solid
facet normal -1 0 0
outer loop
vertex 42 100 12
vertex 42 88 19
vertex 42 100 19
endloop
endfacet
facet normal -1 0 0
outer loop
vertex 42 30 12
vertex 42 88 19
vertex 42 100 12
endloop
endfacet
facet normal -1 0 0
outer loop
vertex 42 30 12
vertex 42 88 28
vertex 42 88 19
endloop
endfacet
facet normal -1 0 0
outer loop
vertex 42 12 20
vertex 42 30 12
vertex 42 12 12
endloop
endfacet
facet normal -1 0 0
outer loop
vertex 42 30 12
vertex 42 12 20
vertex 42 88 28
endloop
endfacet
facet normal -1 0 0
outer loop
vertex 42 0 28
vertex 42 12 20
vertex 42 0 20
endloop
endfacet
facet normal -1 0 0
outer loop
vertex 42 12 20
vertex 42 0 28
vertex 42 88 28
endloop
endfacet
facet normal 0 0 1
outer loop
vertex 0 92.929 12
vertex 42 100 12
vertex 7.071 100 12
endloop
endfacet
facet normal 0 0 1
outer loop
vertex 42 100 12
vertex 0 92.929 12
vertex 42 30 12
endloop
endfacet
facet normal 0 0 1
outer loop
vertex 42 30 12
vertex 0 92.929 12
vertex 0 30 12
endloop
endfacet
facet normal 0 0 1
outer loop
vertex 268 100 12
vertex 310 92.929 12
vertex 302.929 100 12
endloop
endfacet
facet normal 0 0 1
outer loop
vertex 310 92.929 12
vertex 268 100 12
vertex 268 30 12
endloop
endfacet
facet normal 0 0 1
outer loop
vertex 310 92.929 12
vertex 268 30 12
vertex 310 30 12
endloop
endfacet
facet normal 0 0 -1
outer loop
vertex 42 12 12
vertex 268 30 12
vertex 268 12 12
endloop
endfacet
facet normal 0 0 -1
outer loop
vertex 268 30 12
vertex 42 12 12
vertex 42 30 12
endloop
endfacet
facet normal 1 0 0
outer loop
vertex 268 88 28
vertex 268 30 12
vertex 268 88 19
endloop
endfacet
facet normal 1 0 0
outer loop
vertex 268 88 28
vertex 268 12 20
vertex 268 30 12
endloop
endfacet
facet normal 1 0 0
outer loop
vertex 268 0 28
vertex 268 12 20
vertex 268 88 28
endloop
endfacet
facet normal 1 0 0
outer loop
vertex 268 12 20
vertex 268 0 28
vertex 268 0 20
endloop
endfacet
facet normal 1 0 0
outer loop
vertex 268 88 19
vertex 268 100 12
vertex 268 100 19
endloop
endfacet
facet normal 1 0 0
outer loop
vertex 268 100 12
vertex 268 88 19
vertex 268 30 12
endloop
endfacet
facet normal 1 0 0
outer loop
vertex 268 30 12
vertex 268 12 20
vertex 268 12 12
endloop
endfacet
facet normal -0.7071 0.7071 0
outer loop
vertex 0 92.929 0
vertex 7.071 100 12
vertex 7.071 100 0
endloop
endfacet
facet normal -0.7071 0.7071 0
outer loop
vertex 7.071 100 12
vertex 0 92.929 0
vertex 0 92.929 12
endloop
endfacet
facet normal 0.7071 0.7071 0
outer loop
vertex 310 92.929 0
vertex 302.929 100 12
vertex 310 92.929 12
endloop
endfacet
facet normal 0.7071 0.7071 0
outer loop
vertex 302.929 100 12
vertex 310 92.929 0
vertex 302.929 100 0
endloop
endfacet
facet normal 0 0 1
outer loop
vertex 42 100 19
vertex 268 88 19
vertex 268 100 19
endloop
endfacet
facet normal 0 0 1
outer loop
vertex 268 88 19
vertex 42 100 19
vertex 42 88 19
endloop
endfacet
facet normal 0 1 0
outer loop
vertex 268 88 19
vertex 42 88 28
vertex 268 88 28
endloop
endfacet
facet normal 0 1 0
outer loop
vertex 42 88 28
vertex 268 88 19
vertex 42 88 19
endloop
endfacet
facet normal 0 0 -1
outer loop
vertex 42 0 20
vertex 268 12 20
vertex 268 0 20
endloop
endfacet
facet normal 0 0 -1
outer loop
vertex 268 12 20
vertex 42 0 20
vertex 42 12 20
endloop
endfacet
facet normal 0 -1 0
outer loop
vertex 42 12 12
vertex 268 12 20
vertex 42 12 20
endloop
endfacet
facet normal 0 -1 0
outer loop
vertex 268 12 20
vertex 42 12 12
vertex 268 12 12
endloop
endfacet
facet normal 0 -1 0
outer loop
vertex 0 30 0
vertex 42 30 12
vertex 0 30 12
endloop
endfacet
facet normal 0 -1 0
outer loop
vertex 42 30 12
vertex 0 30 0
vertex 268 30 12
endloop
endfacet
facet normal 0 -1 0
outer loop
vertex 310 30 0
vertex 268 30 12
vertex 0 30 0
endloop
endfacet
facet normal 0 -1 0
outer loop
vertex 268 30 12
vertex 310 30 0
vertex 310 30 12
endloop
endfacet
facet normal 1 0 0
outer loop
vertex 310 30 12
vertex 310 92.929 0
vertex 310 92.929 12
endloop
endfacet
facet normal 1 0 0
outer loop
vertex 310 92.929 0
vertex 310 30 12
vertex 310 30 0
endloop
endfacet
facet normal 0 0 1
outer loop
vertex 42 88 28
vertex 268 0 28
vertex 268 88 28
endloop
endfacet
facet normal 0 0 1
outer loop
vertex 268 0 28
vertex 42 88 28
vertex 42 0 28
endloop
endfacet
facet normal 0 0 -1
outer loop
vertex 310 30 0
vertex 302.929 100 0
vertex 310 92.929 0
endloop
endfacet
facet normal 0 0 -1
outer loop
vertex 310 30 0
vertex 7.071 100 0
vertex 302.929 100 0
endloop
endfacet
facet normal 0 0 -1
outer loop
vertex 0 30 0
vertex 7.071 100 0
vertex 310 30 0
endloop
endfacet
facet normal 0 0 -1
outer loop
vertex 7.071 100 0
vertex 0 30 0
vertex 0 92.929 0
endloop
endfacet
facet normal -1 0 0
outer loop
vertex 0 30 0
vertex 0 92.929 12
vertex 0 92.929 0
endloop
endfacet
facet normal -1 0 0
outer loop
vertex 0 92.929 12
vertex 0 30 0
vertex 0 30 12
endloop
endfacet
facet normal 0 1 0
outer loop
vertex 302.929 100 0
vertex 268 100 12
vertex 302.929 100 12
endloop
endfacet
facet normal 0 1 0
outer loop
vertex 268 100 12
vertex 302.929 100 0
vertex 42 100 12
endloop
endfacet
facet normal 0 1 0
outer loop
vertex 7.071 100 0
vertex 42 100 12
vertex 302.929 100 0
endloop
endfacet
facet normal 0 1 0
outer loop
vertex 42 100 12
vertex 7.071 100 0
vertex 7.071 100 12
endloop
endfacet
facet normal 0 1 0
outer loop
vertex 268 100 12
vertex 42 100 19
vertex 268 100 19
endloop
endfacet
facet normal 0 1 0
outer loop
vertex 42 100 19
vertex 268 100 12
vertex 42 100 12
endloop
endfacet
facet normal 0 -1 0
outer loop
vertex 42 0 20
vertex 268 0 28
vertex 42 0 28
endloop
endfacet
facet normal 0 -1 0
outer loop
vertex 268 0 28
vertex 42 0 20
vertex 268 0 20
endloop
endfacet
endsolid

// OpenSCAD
include <../src/wardrobe.scad>;
plank_zx_rear_side();
//github_openscad -o wardrobe_3/plank_zx_rear_side.stl -D wardrobe_n=3 -D cutting_edge=0 -D break_view_length=0 wardrobe_3/plank_zx_rear_side_stl.scad
